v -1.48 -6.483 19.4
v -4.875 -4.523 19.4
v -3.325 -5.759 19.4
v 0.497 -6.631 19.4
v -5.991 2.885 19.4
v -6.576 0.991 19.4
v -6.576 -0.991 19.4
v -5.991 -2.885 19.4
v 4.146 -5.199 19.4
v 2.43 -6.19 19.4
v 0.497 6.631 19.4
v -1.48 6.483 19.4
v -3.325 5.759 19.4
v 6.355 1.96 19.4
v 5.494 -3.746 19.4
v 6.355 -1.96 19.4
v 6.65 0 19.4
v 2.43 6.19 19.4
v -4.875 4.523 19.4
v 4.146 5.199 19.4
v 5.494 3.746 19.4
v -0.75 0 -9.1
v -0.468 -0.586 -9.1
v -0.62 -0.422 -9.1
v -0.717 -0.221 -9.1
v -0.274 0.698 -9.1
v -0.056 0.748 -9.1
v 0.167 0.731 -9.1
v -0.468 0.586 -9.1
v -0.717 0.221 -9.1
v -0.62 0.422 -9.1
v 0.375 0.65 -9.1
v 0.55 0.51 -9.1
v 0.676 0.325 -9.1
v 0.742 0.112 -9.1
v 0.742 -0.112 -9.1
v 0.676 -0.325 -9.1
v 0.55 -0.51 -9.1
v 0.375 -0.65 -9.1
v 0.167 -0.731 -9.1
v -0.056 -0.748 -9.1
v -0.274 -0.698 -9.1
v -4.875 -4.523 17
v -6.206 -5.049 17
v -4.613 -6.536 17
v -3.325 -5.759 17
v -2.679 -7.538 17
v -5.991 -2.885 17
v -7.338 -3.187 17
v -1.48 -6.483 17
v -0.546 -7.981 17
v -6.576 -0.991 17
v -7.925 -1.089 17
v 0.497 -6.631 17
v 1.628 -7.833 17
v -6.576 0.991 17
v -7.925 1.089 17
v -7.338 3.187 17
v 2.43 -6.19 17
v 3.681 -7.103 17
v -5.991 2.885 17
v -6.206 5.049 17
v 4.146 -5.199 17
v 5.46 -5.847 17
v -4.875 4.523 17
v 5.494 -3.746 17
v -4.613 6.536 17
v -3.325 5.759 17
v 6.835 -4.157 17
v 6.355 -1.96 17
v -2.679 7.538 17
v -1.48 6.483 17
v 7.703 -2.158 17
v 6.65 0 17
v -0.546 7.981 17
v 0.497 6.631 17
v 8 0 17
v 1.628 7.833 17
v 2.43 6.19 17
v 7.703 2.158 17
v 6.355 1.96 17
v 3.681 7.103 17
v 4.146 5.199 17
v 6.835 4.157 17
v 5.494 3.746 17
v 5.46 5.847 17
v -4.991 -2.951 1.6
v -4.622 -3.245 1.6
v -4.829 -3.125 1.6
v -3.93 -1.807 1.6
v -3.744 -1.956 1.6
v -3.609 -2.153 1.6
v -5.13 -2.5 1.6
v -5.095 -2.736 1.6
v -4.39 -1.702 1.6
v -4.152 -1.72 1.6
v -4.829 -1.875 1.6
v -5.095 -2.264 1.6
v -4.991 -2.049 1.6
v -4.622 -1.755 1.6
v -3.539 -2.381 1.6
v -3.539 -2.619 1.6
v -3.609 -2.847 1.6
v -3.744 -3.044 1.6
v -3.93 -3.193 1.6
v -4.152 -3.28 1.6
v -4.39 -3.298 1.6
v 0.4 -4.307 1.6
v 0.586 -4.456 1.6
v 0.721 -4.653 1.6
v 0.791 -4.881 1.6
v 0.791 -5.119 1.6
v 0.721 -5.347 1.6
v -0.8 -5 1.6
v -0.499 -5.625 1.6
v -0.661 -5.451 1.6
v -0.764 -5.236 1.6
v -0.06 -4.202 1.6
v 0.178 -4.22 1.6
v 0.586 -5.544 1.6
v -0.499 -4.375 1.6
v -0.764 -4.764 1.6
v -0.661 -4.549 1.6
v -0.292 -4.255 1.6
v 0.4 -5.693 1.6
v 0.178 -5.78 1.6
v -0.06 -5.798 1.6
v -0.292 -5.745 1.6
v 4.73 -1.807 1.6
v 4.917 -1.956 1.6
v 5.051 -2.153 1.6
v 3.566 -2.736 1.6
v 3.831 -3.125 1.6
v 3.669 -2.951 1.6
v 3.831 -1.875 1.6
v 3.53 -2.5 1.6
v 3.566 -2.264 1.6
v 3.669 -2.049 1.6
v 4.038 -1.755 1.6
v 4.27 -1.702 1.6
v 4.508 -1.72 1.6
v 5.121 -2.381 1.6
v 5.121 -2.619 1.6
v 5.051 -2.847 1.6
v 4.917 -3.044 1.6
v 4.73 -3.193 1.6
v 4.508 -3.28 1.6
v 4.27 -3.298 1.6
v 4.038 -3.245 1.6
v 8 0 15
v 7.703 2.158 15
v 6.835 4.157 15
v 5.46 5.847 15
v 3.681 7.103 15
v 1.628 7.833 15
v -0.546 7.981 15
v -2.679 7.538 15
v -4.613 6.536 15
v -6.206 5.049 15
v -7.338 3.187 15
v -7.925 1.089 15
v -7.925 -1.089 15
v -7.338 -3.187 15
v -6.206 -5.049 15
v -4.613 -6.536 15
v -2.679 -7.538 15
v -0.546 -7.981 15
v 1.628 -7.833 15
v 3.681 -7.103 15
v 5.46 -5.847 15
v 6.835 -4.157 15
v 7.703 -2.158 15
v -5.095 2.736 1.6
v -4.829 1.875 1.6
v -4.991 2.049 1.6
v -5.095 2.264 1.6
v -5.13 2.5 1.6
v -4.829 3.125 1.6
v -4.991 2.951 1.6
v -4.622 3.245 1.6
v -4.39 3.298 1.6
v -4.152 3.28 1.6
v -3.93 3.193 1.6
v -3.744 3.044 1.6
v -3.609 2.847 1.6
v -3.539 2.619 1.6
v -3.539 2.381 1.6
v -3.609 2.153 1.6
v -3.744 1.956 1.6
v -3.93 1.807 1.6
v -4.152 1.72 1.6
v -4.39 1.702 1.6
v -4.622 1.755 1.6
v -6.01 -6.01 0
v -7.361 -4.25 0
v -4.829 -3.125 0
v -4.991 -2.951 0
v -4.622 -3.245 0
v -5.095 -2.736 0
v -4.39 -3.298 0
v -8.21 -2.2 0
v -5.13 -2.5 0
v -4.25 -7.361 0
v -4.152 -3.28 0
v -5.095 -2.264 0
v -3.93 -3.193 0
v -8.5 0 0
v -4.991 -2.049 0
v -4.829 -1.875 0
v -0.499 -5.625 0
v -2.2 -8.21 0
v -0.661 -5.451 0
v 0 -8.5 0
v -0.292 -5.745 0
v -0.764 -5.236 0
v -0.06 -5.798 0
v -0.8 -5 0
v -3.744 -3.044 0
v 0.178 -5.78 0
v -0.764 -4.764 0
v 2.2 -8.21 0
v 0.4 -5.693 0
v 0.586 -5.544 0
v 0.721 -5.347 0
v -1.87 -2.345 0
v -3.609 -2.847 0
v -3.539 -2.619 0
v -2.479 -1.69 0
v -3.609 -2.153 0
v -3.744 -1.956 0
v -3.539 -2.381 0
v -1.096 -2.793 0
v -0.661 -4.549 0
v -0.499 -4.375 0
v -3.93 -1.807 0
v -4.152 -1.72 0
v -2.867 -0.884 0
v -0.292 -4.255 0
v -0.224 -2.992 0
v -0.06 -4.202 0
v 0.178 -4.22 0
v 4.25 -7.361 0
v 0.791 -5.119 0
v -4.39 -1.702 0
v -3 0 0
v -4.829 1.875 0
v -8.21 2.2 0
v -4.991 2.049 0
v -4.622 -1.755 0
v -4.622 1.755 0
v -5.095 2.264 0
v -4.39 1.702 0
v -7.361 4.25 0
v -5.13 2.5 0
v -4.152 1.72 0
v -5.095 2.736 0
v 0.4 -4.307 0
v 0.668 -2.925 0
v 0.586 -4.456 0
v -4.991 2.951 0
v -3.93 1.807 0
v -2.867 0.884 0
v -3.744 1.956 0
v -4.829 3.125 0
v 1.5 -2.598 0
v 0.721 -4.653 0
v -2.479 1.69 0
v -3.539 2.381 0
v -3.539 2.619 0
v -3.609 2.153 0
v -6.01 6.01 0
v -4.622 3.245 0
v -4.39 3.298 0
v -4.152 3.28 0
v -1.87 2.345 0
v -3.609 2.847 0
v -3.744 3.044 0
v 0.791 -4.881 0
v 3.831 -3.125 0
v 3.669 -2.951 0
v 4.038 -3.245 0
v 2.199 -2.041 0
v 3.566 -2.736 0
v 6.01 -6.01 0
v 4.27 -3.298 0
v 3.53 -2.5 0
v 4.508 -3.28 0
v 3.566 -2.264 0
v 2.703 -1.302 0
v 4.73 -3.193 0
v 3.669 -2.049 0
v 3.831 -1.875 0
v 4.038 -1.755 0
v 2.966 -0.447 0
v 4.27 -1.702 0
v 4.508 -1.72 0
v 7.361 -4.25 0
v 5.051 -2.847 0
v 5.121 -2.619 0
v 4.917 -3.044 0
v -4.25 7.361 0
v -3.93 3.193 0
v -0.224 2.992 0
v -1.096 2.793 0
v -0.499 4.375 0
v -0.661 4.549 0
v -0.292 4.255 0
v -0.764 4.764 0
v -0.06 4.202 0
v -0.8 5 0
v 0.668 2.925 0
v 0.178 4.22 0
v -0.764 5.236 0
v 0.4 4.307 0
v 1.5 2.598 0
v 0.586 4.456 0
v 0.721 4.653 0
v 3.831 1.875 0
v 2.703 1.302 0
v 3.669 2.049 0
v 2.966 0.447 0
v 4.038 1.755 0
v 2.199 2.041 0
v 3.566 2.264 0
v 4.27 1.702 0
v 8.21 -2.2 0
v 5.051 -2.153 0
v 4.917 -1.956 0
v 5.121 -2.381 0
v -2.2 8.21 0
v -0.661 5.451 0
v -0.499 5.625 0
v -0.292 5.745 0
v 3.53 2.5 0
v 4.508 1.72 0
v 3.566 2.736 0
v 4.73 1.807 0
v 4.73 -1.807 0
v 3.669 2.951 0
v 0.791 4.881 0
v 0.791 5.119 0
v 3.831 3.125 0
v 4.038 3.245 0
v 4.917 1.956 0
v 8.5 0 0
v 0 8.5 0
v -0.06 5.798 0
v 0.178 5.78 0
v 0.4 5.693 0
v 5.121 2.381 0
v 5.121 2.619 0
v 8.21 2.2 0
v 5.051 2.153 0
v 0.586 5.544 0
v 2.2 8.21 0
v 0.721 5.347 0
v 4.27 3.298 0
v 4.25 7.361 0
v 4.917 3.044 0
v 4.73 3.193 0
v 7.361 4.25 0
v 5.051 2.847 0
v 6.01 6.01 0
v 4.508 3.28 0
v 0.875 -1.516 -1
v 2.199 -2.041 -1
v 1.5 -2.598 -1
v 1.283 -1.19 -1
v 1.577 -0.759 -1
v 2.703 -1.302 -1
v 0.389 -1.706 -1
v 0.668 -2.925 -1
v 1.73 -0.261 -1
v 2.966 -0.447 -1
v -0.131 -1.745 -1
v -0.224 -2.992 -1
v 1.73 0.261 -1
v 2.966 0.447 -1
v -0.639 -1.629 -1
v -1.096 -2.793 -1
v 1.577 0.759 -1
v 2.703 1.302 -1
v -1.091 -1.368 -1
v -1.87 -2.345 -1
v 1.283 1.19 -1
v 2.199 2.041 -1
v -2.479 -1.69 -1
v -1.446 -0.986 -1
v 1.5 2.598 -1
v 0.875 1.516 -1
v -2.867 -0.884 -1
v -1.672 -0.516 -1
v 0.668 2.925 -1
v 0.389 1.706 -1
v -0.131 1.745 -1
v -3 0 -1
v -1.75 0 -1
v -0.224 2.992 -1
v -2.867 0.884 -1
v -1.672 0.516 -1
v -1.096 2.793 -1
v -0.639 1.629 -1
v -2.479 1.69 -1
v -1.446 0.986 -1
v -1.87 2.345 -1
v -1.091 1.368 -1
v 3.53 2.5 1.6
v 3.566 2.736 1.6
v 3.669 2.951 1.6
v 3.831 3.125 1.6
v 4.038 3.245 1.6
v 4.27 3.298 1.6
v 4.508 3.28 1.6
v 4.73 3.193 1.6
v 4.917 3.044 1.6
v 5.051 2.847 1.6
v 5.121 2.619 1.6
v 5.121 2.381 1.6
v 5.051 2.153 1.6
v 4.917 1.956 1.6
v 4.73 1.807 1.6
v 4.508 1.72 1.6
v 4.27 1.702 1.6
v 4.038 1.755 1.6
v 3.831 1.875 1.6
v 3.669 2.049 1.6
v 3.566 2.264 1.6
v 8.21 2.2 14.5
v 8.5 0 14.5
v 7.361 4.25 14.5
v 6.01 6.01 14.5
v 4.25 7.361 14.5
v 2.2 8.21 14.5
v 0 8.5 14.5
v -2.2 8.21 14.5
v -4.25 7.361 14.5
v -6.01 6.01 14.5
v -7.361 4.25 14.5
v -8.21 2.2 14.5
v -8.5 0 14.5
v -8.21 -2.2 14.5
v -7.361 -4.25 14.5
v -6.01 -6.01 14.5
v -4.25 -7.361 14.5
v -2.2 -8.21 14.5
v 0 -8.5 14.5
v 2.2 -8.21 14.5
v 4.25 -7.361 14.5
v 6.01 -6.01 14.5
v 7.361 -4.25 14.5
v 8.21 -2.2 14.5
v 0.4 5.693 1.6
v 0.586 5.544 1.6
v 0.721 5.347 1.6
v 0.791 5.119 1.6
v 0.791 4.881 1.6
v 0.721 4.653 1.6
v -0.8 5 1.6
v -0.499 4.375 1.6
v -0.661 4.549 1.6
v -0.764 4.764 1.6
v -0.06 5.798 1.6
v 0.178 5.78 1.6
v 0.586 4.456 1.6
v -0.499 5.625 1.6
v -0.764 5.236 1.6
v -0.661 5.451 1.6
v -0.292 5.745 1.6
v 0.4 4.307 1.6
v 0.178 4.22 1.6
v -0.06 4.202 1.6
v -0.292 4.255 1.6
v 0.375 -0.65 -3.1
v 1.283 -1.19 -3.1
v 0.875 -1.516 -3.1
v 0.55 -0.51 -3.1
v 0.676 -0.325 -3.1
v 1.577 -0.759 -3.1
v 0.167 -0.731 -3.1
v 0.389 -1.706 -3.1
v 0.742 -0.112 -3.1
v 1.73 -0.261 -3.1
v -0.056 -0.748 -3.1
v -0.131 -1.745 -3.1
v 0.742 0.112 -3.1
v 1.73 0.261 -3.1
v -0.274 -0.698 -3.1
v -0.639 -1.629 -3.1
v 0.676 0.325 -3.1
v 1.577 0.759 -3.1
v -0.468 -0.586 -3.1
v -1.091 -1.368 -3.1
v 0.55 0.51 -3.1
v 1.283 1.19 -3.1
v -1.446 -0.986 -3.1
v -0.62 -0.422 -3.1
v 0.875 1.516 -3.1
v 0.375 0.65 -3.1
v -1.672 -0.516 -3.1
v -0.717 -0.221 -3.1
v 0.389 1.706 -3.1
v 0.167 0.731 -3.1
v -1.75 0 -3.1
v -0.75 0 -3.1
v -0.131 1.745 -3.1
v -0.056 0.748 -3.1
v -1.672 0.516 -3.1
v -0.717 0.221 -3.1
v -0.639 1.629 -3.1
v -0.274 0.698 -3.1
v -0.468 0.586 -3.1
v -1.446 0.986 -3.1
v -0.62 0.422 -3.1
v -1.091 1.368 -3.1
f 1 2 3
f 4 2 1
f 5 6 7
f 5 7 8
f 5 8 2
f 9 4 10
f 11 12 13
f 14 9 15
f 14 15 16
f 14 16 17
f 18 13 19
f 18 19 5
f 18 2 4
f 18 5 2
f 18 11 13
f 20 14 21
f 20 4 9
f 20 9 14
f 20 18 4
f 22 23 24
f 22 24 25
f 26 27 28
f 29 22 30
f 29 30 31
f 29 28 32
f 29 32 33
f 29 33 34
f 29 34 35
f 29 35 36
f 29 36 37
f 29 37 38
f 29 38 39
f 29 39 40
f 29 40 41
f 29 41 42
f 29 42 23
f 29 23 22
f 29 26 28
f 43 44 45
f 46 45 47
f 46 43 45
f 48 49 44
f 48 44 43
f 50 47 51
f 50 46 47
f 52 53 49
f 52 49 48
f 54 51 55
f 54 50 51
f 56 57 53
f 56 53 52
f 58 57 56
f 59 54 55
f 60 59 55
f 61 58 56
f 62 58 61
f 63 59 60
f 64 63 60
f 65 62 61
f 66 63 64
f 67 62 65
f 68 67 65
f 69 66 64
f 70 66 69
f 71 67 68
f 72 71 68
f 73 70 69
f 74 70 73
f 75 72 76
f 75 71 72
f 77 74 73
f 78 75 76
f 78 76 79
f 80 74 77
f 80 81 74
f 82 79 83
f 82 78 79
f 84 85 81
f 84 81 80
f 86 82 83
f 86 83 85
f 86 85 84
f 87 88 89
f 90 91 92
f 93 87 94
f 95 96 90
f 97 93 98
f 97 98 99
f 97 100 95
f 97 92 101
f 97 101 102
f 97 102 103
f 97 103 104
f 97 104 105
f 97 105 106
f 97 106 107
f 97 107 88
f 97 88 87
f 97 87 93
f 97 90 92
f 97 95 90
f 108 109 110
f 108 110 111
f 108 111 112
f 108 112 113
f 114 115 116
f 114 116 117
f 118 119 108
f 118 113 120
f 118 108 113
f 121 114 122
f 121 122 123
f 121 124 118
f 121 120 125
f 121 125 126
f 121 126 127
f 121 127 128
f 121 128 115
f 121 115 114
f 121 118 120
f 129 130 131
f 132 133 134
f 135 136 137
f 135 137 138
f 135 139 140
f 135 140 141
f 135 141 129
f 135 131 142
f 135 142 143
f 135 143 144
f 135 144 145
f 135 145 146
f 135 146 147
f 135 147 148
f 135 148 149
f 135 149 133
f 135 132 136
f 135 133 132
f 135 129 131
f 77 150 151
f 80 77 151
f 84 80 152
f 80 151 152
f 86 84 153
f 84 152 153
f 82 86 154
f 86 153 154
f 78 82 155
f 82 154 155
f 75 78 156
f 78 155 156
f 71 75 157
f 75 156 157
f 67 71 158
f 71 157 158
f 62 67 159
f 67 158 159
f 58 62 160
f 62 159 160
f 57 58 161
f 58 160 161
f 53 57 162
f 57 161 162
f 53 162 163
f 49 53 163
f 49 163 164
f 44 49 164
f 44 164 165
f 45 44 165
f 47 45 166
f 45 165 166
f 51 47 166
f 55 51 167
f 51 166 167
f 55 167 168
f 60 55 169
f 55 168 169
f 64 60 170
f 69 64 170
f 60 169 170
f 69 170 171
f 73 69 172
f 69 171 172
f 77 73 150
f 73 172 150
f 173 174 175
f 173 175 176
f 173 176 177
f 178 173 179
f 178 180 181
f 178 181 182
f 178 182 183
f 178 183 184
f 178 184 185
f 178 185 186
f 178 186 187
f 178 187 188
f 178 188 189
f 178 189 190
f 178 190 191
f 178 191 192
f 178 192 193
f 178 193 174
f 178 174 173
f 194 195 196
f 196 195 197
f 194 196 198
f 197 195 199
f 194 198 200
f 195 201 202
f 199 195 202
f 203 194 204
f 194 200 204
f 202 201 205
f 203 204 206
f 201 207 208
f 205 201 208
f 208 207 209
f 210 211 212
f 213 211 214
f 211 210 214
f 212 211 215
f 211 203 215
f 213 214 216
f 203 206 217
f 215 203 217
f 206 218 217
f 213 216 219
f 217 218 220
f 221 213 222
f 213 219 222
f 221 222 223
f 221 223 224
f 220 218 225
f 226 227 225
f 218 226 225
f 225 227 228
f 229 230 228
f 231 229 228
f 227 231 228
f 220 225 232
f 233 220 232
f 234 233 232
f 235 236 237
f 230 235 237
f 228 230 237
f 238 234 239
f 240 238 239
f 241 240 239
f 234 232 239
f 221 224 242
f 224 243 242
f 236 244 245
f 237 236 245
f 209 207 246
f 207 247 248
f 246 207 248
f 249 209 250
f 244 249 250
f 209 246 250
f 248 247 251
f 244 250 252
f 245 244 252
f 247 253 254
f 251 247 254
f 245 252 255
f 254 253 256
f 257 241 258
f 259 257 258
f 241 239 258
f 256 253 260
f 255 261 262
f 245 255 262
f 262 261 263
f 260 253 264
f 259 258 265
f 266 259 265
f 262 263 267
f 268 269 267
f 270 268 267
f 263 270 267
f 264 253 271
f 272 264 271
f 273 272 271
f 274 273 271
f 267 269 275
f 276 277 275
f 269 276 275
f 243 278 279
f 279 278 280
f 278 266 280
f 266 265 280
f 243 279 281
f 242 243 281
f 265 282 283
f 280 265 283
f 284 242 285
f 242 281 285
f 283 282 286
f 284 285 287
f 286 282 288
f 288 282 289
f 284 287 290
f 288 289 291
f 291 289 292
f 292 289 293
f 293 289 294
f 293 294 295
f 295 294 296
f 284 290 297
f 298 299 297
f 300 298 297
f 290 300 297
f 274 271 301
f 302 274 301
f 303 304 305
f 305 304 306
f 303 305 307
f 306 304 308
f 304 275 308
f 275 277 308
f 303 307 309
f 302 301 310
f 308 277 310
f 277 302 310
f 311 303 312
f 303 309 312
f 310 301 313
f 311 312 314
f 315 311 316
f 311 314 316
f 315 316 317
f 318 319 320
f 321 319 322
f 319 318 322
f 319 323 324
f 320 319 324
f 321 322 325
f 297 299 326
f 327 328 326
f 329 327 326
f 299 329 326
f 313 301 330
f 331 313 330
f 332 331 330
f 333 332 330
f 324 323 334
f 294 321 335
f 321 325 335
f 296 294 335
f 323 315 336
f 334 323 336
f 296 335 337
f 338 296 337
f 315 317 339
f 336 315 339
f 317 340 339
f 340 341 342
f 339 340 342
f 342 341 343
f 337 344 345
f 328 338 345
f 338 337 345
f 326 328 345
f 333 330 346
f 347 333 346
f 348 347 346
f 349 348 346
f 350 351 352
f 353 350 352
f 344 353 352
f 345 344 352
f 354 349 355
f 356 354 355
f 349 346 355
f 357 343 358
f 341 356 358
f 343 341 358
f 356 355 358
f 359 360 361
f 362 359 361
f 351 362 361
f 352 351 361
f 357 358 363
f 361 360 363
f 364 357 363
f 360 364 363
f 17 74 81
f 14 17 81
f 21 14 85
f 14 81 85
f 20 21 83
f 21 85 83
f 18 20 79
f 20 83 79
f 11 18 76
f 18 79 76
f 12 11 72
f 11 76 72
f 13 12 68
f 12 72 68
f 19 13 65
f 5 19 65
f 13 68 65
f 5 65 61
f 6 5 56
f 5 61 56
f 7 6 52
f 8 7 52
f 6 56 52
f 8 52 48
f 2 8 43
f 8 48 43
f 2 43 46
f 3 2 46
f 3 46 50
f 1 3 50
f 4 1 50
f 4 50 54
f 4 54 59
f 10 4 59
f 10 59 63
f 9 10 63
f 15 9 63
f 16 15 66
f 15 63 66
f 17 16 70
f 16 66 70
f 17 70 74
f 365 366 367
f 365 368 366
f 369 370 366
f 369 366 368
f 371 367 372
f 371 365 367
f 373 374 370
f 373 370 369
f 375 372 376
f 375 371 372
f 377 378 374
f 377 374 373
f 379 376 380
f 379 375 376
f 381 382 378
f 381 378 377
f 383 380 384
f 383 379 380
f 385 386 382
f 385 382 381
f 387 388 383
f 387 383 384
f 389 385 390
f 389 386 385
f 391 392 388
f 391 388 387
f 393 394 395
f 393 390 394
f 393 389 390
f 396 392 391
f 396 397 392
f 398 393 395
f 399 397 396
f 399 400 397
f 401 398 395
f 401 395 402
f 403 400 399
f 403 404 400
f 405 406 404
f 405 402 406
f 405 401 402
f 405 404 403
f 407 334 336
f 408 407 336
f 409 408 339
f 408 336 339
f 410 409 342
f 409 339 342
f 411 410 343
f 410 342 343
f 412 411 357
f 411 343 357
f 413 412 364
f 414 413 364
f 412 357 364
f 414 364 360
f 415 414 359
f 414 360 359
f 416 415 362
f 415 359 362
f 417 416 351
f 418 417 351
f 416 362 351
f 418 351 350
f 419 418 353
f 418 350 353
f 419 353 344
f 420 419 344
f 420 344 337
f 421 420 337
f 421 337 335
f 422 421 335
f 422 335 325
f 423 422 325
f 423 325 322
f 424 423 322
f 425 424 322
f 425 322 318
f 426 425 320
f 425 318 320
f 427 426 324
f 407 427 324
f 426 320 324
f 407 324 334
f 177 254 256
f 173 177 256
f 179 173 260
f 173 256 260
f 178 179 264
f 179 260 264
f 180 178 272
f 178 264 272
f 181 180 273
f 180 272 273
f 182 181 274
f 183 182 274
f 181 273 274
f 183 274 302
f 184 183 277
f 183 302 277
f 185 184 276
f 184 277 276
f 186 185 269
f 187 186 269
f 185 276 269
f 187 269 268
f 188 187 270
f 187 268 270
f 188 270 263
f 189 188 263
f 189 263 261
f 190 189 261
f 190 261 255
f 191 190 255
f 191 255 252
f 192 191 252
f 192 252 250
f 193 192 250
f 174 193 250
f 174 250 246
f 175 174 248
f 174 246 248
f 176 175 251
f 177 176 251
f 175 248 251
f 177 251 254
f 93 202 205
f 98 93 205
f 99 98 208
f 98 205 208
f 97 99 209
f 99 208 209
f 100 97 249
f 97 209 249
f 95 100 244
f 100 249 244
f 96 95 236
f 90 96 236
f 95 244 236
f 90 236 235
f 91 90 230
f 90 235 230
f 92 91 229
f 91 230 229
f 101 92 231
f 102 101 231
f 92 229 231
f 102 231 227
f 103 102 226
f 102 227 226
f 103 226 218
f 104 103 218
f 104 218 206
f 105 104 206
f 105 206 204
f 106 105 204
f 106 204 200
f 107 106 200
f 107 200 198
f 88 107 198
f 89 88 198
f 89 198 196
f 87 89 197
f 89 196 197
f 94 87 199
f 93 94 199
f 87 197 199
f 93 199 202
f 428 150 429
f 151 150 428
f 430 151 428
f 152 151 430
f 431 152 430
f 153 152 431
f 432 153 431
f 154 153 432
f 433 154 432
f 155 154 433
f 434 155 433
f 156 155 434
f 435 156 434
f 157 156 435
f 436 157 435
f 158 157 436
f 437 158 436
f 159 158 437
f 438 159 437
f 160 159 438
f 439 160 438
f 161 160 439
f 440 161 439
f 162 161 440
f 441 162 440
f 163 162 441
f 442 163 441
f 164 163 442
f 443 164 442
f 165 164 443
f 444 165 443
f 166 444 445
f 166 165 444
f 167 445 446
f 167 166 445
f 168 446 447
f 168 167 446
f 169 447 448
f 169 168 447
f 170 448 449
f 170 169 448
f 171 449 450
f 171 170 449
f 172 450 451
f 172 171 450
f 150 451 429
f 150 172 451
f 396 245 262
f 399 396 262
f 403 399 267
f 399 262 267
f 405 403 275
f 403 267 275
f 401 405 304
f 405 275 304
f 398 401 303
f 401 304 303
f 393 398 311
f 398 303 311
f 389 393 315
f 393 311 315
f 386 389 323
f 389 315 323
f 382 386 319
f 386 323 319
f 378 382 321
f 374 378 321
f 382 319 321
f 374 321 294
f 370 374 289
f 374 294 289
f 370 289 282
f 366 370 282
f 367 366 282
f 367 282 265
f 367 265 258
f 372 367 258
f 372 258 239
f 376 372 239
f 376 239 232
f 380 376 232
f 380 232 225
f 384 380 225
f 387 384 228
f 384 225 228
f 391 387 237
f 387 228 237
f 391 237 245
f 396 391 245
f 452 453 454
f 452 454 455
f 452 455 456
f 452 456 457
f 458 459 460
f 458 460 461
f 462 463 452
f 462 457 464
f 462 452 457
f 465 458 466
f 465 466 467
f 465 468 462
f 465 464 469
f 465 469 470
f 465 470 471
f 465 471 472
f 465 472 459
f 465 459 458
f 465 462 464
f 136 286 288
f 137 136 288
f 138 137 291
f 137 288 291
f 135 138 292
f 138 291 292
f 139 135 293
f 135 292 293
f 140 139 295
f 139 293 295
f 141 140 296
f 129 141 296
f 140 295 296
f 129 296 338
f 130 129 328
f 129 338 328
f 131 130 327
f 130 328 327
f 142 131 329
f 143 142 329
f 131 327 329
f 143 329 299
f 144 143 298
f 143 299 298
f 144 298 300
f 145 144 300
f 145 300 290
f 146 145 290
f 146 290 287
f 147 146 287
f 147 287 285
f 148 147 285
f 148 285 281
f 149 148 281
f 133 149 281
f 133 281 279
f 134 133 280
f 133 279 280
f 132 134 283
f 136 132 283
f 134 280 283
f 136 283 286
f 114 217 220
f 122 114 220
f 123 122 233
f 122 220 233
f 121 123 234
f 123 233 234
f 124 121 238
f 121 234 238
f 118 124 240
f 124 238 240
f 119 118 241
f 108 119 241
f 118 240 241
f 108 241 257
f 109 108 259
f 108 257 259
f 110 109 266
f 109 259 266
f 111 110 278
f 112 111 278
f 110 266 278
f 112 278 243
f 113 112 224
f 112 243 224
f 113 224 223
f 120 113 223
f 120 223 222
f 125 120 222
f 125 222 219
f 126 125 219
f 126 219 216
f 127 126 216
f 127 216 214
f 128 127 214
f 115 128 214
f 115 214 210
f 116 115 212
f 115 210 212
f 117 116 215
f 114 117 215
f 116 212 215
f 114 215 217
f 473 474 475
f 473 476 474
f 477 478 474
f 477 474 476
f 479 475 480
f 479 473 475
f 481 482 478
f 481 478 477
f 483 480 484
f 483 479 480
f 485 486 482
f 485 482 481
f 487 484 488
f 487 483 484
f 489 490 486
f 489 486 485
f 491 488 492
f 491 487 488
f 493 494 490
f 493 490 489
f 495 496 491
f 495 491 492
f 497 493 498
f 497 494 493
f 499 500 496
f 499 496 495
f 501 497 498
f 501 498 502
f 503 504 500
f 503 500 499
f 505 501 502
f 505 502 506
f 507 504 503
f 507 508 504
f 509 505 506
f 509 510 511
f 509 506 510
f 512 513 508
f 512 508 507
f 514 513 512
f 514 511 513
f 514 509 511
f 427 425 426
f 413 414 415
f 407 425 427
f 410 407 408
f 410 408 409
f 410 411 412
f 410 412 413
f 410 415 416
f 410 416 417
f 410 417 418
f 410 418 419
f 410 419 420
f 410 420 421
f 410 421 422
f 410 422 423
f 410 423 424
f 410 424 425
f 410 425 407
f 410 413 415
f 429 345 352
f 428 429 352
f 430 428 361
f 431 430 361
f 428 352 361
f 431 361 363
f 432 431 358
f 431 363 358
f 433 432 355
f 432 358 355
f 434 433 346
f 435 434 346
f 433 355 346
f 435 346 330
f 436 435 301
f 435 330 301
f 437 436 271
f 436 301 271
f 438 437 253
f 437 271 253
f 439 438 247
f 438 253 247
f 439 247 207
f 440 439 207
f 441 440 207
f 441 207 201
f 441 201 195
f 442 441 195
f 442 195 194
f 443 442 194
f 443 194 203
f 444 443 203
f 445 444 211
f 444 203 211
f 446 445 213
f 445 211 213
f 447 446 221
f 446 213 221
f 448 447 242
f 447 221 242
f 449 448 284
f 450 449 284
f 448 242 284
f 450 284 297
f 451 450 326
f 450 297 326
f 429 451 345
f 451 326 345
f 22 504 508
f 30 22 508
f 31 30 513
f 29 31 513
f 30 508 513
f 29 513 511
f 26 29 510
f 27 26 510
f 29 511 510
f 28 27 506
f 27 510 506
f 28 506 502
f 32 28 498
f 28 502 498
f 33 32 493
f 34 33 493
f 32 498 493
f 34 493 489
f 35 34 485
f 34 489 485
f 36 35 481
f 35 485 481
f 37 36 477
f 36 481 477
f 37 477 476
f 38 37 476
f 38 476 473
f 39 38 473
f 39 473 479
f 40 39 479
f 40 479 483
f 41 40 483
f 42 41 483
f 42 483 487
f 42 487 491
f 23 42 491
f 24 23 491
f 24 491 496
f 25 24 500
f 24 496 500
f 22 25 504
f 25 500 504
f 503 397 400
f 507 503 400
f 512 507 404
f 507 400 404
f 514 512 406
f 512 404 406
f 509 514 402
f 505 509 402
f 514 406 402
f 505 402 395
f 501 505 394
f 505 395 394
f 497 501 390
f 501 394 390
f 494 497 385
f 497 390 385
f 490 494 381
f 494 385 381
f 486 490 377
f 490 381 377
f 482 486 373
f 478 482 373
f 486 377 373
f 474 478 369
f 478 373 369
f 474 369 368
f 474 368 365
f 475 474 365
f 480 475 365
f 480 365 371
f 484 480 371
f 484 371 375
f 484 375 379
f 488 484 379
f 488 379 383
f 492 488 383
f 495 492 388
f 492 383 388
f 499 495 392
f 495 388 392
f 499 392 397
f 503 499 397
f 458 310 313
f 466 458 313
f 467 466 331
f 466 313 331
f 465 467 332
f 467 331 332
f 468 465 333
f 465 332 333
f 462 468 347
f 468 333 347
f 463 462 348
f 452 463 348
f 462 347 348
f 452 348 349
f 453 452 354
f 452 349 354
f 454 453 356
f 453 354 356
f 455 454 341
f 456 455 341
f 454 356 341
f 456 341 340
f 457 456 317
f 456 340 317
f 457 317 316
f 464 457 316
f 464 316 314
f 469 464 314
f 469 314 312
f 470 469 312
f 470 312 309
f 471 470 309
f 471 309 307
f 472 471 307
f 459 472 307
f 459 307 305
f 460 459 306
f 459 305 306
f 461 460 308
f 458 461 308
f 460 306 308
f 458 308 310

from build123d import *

# Parameters (mm, degrees)
SKETCH2_R           = 8.5
BOSS_EXTRUDE1_DEPTH = 15
CHAMFER1_SIZE       = 0.5
SKETCH3_R           = 8
BOSS_EXTRUDE2_DEPTH = 2
SKETCH4_R           = 6.65
BOSS_EXTRUDE3_DEPTH = 2.4
SKETCH5_R           = 0.8
CUT_EXTRUDE1_DEPTH  = 1.6
SKETCH6_R           = 3
BOSS_EXTRUDE4_DEPTH = 1
SKETCH7_R           = 1.75
BOSS_EXTRUDE5_DEPTH = 2.1
SKETCH8_R           = 0.75
BOSS_EXTRUDE6_DEPTH = 6


with BuildPart() as part:
    # Sketch2 → Boss-Extrude1 (new body)
    with BuildSketch(Plane.XY):
        Circle(SKETCH2_R)
    extrude(amount=BOSS_EXTRUDE1_DEPTH)

    # Chamfer1
    chamfer1_edges = [part.edges().sort_by_distance(p)[0] for p in [
        (-8.5, 0, 15),
    ]]
    chamfer(chamfer1_edges, length=CHAMFER1_SIZE)

    # Sketch3 → Boss-Extrude2 (add)
    with BuildSketch(Plane.XY.offset(15)):
        Circle(SKETCH3_R)
    extrude(amount=BOSS_EXTRUDE2_DEPTH)

    # Sketch4 → Boss-Extrude3 (add)
    with BuildSketch(Plane.XY.offset(17)):
        Circle(SKETCH4_R)
    extrude(amount=BOSS_EXTRUDE3_DEPTH)

    # Sketch5 → Cut-Extrude1 (cut)
    with BuildSketch(Plane(origin=(0, 0, 0), x_dir=(-1, 0, 0), z_dir=(0, 0, -1))):
        with Locations((0, 5)):
            Circle(SKETCH5_R)
        with Locations((4.330127019, 2.5)):
            Circle(SKETCH5_R)
        with Locations((4.330127019, -2.5)):
            Circle(SKETCH5_R)
        with Locations((0, -5)):
            Circle(SKETCH5_R)
        with Locations((-4.330127019, -2.5)):
            Circle(SKETCH5_R)
        with Locations((-4.330127019, 2.5)):
            Circle(SKETCH5_R)
    extrude(amount=-CUT_EXTRUDE1_DEPTH, mode=Mode.SUBTRACT)

    # Sketch6 → Boss-Extrude4 (add)
    with BuildSketch(Plane(origin=(0, 0, 0), x_dir=(-1, 0, 0), z_dir=(0, 0, -1))):
        Circle(SKETCH6_R)
    extrude(amount=BOSS_EXTRUDE4_DEPTH)

    # Sketch7 → Boss-Extrude5 (add)
    with BuildSketch(Plane(origin=(0, 0, -1), x_dir=(-1, 0, 0), z_dir=(0, 0, -1))):
        Circle(SKETCH7_R)
    extrude(amount=BOSS_EXTRUDE5_DEPTH)

    # Sketch8 → Boss-Extrude6 (add)
    with BuildSketch(Plane(origin=(0, 0, -3.1), x_dir=(-1, 0, 0), z_dir=(0, 0, -1))):
        Circle(SKETCH8_R)
    extrude(amount=BOSS_EXTRUDE6_DEPTH)


solid = part.part
